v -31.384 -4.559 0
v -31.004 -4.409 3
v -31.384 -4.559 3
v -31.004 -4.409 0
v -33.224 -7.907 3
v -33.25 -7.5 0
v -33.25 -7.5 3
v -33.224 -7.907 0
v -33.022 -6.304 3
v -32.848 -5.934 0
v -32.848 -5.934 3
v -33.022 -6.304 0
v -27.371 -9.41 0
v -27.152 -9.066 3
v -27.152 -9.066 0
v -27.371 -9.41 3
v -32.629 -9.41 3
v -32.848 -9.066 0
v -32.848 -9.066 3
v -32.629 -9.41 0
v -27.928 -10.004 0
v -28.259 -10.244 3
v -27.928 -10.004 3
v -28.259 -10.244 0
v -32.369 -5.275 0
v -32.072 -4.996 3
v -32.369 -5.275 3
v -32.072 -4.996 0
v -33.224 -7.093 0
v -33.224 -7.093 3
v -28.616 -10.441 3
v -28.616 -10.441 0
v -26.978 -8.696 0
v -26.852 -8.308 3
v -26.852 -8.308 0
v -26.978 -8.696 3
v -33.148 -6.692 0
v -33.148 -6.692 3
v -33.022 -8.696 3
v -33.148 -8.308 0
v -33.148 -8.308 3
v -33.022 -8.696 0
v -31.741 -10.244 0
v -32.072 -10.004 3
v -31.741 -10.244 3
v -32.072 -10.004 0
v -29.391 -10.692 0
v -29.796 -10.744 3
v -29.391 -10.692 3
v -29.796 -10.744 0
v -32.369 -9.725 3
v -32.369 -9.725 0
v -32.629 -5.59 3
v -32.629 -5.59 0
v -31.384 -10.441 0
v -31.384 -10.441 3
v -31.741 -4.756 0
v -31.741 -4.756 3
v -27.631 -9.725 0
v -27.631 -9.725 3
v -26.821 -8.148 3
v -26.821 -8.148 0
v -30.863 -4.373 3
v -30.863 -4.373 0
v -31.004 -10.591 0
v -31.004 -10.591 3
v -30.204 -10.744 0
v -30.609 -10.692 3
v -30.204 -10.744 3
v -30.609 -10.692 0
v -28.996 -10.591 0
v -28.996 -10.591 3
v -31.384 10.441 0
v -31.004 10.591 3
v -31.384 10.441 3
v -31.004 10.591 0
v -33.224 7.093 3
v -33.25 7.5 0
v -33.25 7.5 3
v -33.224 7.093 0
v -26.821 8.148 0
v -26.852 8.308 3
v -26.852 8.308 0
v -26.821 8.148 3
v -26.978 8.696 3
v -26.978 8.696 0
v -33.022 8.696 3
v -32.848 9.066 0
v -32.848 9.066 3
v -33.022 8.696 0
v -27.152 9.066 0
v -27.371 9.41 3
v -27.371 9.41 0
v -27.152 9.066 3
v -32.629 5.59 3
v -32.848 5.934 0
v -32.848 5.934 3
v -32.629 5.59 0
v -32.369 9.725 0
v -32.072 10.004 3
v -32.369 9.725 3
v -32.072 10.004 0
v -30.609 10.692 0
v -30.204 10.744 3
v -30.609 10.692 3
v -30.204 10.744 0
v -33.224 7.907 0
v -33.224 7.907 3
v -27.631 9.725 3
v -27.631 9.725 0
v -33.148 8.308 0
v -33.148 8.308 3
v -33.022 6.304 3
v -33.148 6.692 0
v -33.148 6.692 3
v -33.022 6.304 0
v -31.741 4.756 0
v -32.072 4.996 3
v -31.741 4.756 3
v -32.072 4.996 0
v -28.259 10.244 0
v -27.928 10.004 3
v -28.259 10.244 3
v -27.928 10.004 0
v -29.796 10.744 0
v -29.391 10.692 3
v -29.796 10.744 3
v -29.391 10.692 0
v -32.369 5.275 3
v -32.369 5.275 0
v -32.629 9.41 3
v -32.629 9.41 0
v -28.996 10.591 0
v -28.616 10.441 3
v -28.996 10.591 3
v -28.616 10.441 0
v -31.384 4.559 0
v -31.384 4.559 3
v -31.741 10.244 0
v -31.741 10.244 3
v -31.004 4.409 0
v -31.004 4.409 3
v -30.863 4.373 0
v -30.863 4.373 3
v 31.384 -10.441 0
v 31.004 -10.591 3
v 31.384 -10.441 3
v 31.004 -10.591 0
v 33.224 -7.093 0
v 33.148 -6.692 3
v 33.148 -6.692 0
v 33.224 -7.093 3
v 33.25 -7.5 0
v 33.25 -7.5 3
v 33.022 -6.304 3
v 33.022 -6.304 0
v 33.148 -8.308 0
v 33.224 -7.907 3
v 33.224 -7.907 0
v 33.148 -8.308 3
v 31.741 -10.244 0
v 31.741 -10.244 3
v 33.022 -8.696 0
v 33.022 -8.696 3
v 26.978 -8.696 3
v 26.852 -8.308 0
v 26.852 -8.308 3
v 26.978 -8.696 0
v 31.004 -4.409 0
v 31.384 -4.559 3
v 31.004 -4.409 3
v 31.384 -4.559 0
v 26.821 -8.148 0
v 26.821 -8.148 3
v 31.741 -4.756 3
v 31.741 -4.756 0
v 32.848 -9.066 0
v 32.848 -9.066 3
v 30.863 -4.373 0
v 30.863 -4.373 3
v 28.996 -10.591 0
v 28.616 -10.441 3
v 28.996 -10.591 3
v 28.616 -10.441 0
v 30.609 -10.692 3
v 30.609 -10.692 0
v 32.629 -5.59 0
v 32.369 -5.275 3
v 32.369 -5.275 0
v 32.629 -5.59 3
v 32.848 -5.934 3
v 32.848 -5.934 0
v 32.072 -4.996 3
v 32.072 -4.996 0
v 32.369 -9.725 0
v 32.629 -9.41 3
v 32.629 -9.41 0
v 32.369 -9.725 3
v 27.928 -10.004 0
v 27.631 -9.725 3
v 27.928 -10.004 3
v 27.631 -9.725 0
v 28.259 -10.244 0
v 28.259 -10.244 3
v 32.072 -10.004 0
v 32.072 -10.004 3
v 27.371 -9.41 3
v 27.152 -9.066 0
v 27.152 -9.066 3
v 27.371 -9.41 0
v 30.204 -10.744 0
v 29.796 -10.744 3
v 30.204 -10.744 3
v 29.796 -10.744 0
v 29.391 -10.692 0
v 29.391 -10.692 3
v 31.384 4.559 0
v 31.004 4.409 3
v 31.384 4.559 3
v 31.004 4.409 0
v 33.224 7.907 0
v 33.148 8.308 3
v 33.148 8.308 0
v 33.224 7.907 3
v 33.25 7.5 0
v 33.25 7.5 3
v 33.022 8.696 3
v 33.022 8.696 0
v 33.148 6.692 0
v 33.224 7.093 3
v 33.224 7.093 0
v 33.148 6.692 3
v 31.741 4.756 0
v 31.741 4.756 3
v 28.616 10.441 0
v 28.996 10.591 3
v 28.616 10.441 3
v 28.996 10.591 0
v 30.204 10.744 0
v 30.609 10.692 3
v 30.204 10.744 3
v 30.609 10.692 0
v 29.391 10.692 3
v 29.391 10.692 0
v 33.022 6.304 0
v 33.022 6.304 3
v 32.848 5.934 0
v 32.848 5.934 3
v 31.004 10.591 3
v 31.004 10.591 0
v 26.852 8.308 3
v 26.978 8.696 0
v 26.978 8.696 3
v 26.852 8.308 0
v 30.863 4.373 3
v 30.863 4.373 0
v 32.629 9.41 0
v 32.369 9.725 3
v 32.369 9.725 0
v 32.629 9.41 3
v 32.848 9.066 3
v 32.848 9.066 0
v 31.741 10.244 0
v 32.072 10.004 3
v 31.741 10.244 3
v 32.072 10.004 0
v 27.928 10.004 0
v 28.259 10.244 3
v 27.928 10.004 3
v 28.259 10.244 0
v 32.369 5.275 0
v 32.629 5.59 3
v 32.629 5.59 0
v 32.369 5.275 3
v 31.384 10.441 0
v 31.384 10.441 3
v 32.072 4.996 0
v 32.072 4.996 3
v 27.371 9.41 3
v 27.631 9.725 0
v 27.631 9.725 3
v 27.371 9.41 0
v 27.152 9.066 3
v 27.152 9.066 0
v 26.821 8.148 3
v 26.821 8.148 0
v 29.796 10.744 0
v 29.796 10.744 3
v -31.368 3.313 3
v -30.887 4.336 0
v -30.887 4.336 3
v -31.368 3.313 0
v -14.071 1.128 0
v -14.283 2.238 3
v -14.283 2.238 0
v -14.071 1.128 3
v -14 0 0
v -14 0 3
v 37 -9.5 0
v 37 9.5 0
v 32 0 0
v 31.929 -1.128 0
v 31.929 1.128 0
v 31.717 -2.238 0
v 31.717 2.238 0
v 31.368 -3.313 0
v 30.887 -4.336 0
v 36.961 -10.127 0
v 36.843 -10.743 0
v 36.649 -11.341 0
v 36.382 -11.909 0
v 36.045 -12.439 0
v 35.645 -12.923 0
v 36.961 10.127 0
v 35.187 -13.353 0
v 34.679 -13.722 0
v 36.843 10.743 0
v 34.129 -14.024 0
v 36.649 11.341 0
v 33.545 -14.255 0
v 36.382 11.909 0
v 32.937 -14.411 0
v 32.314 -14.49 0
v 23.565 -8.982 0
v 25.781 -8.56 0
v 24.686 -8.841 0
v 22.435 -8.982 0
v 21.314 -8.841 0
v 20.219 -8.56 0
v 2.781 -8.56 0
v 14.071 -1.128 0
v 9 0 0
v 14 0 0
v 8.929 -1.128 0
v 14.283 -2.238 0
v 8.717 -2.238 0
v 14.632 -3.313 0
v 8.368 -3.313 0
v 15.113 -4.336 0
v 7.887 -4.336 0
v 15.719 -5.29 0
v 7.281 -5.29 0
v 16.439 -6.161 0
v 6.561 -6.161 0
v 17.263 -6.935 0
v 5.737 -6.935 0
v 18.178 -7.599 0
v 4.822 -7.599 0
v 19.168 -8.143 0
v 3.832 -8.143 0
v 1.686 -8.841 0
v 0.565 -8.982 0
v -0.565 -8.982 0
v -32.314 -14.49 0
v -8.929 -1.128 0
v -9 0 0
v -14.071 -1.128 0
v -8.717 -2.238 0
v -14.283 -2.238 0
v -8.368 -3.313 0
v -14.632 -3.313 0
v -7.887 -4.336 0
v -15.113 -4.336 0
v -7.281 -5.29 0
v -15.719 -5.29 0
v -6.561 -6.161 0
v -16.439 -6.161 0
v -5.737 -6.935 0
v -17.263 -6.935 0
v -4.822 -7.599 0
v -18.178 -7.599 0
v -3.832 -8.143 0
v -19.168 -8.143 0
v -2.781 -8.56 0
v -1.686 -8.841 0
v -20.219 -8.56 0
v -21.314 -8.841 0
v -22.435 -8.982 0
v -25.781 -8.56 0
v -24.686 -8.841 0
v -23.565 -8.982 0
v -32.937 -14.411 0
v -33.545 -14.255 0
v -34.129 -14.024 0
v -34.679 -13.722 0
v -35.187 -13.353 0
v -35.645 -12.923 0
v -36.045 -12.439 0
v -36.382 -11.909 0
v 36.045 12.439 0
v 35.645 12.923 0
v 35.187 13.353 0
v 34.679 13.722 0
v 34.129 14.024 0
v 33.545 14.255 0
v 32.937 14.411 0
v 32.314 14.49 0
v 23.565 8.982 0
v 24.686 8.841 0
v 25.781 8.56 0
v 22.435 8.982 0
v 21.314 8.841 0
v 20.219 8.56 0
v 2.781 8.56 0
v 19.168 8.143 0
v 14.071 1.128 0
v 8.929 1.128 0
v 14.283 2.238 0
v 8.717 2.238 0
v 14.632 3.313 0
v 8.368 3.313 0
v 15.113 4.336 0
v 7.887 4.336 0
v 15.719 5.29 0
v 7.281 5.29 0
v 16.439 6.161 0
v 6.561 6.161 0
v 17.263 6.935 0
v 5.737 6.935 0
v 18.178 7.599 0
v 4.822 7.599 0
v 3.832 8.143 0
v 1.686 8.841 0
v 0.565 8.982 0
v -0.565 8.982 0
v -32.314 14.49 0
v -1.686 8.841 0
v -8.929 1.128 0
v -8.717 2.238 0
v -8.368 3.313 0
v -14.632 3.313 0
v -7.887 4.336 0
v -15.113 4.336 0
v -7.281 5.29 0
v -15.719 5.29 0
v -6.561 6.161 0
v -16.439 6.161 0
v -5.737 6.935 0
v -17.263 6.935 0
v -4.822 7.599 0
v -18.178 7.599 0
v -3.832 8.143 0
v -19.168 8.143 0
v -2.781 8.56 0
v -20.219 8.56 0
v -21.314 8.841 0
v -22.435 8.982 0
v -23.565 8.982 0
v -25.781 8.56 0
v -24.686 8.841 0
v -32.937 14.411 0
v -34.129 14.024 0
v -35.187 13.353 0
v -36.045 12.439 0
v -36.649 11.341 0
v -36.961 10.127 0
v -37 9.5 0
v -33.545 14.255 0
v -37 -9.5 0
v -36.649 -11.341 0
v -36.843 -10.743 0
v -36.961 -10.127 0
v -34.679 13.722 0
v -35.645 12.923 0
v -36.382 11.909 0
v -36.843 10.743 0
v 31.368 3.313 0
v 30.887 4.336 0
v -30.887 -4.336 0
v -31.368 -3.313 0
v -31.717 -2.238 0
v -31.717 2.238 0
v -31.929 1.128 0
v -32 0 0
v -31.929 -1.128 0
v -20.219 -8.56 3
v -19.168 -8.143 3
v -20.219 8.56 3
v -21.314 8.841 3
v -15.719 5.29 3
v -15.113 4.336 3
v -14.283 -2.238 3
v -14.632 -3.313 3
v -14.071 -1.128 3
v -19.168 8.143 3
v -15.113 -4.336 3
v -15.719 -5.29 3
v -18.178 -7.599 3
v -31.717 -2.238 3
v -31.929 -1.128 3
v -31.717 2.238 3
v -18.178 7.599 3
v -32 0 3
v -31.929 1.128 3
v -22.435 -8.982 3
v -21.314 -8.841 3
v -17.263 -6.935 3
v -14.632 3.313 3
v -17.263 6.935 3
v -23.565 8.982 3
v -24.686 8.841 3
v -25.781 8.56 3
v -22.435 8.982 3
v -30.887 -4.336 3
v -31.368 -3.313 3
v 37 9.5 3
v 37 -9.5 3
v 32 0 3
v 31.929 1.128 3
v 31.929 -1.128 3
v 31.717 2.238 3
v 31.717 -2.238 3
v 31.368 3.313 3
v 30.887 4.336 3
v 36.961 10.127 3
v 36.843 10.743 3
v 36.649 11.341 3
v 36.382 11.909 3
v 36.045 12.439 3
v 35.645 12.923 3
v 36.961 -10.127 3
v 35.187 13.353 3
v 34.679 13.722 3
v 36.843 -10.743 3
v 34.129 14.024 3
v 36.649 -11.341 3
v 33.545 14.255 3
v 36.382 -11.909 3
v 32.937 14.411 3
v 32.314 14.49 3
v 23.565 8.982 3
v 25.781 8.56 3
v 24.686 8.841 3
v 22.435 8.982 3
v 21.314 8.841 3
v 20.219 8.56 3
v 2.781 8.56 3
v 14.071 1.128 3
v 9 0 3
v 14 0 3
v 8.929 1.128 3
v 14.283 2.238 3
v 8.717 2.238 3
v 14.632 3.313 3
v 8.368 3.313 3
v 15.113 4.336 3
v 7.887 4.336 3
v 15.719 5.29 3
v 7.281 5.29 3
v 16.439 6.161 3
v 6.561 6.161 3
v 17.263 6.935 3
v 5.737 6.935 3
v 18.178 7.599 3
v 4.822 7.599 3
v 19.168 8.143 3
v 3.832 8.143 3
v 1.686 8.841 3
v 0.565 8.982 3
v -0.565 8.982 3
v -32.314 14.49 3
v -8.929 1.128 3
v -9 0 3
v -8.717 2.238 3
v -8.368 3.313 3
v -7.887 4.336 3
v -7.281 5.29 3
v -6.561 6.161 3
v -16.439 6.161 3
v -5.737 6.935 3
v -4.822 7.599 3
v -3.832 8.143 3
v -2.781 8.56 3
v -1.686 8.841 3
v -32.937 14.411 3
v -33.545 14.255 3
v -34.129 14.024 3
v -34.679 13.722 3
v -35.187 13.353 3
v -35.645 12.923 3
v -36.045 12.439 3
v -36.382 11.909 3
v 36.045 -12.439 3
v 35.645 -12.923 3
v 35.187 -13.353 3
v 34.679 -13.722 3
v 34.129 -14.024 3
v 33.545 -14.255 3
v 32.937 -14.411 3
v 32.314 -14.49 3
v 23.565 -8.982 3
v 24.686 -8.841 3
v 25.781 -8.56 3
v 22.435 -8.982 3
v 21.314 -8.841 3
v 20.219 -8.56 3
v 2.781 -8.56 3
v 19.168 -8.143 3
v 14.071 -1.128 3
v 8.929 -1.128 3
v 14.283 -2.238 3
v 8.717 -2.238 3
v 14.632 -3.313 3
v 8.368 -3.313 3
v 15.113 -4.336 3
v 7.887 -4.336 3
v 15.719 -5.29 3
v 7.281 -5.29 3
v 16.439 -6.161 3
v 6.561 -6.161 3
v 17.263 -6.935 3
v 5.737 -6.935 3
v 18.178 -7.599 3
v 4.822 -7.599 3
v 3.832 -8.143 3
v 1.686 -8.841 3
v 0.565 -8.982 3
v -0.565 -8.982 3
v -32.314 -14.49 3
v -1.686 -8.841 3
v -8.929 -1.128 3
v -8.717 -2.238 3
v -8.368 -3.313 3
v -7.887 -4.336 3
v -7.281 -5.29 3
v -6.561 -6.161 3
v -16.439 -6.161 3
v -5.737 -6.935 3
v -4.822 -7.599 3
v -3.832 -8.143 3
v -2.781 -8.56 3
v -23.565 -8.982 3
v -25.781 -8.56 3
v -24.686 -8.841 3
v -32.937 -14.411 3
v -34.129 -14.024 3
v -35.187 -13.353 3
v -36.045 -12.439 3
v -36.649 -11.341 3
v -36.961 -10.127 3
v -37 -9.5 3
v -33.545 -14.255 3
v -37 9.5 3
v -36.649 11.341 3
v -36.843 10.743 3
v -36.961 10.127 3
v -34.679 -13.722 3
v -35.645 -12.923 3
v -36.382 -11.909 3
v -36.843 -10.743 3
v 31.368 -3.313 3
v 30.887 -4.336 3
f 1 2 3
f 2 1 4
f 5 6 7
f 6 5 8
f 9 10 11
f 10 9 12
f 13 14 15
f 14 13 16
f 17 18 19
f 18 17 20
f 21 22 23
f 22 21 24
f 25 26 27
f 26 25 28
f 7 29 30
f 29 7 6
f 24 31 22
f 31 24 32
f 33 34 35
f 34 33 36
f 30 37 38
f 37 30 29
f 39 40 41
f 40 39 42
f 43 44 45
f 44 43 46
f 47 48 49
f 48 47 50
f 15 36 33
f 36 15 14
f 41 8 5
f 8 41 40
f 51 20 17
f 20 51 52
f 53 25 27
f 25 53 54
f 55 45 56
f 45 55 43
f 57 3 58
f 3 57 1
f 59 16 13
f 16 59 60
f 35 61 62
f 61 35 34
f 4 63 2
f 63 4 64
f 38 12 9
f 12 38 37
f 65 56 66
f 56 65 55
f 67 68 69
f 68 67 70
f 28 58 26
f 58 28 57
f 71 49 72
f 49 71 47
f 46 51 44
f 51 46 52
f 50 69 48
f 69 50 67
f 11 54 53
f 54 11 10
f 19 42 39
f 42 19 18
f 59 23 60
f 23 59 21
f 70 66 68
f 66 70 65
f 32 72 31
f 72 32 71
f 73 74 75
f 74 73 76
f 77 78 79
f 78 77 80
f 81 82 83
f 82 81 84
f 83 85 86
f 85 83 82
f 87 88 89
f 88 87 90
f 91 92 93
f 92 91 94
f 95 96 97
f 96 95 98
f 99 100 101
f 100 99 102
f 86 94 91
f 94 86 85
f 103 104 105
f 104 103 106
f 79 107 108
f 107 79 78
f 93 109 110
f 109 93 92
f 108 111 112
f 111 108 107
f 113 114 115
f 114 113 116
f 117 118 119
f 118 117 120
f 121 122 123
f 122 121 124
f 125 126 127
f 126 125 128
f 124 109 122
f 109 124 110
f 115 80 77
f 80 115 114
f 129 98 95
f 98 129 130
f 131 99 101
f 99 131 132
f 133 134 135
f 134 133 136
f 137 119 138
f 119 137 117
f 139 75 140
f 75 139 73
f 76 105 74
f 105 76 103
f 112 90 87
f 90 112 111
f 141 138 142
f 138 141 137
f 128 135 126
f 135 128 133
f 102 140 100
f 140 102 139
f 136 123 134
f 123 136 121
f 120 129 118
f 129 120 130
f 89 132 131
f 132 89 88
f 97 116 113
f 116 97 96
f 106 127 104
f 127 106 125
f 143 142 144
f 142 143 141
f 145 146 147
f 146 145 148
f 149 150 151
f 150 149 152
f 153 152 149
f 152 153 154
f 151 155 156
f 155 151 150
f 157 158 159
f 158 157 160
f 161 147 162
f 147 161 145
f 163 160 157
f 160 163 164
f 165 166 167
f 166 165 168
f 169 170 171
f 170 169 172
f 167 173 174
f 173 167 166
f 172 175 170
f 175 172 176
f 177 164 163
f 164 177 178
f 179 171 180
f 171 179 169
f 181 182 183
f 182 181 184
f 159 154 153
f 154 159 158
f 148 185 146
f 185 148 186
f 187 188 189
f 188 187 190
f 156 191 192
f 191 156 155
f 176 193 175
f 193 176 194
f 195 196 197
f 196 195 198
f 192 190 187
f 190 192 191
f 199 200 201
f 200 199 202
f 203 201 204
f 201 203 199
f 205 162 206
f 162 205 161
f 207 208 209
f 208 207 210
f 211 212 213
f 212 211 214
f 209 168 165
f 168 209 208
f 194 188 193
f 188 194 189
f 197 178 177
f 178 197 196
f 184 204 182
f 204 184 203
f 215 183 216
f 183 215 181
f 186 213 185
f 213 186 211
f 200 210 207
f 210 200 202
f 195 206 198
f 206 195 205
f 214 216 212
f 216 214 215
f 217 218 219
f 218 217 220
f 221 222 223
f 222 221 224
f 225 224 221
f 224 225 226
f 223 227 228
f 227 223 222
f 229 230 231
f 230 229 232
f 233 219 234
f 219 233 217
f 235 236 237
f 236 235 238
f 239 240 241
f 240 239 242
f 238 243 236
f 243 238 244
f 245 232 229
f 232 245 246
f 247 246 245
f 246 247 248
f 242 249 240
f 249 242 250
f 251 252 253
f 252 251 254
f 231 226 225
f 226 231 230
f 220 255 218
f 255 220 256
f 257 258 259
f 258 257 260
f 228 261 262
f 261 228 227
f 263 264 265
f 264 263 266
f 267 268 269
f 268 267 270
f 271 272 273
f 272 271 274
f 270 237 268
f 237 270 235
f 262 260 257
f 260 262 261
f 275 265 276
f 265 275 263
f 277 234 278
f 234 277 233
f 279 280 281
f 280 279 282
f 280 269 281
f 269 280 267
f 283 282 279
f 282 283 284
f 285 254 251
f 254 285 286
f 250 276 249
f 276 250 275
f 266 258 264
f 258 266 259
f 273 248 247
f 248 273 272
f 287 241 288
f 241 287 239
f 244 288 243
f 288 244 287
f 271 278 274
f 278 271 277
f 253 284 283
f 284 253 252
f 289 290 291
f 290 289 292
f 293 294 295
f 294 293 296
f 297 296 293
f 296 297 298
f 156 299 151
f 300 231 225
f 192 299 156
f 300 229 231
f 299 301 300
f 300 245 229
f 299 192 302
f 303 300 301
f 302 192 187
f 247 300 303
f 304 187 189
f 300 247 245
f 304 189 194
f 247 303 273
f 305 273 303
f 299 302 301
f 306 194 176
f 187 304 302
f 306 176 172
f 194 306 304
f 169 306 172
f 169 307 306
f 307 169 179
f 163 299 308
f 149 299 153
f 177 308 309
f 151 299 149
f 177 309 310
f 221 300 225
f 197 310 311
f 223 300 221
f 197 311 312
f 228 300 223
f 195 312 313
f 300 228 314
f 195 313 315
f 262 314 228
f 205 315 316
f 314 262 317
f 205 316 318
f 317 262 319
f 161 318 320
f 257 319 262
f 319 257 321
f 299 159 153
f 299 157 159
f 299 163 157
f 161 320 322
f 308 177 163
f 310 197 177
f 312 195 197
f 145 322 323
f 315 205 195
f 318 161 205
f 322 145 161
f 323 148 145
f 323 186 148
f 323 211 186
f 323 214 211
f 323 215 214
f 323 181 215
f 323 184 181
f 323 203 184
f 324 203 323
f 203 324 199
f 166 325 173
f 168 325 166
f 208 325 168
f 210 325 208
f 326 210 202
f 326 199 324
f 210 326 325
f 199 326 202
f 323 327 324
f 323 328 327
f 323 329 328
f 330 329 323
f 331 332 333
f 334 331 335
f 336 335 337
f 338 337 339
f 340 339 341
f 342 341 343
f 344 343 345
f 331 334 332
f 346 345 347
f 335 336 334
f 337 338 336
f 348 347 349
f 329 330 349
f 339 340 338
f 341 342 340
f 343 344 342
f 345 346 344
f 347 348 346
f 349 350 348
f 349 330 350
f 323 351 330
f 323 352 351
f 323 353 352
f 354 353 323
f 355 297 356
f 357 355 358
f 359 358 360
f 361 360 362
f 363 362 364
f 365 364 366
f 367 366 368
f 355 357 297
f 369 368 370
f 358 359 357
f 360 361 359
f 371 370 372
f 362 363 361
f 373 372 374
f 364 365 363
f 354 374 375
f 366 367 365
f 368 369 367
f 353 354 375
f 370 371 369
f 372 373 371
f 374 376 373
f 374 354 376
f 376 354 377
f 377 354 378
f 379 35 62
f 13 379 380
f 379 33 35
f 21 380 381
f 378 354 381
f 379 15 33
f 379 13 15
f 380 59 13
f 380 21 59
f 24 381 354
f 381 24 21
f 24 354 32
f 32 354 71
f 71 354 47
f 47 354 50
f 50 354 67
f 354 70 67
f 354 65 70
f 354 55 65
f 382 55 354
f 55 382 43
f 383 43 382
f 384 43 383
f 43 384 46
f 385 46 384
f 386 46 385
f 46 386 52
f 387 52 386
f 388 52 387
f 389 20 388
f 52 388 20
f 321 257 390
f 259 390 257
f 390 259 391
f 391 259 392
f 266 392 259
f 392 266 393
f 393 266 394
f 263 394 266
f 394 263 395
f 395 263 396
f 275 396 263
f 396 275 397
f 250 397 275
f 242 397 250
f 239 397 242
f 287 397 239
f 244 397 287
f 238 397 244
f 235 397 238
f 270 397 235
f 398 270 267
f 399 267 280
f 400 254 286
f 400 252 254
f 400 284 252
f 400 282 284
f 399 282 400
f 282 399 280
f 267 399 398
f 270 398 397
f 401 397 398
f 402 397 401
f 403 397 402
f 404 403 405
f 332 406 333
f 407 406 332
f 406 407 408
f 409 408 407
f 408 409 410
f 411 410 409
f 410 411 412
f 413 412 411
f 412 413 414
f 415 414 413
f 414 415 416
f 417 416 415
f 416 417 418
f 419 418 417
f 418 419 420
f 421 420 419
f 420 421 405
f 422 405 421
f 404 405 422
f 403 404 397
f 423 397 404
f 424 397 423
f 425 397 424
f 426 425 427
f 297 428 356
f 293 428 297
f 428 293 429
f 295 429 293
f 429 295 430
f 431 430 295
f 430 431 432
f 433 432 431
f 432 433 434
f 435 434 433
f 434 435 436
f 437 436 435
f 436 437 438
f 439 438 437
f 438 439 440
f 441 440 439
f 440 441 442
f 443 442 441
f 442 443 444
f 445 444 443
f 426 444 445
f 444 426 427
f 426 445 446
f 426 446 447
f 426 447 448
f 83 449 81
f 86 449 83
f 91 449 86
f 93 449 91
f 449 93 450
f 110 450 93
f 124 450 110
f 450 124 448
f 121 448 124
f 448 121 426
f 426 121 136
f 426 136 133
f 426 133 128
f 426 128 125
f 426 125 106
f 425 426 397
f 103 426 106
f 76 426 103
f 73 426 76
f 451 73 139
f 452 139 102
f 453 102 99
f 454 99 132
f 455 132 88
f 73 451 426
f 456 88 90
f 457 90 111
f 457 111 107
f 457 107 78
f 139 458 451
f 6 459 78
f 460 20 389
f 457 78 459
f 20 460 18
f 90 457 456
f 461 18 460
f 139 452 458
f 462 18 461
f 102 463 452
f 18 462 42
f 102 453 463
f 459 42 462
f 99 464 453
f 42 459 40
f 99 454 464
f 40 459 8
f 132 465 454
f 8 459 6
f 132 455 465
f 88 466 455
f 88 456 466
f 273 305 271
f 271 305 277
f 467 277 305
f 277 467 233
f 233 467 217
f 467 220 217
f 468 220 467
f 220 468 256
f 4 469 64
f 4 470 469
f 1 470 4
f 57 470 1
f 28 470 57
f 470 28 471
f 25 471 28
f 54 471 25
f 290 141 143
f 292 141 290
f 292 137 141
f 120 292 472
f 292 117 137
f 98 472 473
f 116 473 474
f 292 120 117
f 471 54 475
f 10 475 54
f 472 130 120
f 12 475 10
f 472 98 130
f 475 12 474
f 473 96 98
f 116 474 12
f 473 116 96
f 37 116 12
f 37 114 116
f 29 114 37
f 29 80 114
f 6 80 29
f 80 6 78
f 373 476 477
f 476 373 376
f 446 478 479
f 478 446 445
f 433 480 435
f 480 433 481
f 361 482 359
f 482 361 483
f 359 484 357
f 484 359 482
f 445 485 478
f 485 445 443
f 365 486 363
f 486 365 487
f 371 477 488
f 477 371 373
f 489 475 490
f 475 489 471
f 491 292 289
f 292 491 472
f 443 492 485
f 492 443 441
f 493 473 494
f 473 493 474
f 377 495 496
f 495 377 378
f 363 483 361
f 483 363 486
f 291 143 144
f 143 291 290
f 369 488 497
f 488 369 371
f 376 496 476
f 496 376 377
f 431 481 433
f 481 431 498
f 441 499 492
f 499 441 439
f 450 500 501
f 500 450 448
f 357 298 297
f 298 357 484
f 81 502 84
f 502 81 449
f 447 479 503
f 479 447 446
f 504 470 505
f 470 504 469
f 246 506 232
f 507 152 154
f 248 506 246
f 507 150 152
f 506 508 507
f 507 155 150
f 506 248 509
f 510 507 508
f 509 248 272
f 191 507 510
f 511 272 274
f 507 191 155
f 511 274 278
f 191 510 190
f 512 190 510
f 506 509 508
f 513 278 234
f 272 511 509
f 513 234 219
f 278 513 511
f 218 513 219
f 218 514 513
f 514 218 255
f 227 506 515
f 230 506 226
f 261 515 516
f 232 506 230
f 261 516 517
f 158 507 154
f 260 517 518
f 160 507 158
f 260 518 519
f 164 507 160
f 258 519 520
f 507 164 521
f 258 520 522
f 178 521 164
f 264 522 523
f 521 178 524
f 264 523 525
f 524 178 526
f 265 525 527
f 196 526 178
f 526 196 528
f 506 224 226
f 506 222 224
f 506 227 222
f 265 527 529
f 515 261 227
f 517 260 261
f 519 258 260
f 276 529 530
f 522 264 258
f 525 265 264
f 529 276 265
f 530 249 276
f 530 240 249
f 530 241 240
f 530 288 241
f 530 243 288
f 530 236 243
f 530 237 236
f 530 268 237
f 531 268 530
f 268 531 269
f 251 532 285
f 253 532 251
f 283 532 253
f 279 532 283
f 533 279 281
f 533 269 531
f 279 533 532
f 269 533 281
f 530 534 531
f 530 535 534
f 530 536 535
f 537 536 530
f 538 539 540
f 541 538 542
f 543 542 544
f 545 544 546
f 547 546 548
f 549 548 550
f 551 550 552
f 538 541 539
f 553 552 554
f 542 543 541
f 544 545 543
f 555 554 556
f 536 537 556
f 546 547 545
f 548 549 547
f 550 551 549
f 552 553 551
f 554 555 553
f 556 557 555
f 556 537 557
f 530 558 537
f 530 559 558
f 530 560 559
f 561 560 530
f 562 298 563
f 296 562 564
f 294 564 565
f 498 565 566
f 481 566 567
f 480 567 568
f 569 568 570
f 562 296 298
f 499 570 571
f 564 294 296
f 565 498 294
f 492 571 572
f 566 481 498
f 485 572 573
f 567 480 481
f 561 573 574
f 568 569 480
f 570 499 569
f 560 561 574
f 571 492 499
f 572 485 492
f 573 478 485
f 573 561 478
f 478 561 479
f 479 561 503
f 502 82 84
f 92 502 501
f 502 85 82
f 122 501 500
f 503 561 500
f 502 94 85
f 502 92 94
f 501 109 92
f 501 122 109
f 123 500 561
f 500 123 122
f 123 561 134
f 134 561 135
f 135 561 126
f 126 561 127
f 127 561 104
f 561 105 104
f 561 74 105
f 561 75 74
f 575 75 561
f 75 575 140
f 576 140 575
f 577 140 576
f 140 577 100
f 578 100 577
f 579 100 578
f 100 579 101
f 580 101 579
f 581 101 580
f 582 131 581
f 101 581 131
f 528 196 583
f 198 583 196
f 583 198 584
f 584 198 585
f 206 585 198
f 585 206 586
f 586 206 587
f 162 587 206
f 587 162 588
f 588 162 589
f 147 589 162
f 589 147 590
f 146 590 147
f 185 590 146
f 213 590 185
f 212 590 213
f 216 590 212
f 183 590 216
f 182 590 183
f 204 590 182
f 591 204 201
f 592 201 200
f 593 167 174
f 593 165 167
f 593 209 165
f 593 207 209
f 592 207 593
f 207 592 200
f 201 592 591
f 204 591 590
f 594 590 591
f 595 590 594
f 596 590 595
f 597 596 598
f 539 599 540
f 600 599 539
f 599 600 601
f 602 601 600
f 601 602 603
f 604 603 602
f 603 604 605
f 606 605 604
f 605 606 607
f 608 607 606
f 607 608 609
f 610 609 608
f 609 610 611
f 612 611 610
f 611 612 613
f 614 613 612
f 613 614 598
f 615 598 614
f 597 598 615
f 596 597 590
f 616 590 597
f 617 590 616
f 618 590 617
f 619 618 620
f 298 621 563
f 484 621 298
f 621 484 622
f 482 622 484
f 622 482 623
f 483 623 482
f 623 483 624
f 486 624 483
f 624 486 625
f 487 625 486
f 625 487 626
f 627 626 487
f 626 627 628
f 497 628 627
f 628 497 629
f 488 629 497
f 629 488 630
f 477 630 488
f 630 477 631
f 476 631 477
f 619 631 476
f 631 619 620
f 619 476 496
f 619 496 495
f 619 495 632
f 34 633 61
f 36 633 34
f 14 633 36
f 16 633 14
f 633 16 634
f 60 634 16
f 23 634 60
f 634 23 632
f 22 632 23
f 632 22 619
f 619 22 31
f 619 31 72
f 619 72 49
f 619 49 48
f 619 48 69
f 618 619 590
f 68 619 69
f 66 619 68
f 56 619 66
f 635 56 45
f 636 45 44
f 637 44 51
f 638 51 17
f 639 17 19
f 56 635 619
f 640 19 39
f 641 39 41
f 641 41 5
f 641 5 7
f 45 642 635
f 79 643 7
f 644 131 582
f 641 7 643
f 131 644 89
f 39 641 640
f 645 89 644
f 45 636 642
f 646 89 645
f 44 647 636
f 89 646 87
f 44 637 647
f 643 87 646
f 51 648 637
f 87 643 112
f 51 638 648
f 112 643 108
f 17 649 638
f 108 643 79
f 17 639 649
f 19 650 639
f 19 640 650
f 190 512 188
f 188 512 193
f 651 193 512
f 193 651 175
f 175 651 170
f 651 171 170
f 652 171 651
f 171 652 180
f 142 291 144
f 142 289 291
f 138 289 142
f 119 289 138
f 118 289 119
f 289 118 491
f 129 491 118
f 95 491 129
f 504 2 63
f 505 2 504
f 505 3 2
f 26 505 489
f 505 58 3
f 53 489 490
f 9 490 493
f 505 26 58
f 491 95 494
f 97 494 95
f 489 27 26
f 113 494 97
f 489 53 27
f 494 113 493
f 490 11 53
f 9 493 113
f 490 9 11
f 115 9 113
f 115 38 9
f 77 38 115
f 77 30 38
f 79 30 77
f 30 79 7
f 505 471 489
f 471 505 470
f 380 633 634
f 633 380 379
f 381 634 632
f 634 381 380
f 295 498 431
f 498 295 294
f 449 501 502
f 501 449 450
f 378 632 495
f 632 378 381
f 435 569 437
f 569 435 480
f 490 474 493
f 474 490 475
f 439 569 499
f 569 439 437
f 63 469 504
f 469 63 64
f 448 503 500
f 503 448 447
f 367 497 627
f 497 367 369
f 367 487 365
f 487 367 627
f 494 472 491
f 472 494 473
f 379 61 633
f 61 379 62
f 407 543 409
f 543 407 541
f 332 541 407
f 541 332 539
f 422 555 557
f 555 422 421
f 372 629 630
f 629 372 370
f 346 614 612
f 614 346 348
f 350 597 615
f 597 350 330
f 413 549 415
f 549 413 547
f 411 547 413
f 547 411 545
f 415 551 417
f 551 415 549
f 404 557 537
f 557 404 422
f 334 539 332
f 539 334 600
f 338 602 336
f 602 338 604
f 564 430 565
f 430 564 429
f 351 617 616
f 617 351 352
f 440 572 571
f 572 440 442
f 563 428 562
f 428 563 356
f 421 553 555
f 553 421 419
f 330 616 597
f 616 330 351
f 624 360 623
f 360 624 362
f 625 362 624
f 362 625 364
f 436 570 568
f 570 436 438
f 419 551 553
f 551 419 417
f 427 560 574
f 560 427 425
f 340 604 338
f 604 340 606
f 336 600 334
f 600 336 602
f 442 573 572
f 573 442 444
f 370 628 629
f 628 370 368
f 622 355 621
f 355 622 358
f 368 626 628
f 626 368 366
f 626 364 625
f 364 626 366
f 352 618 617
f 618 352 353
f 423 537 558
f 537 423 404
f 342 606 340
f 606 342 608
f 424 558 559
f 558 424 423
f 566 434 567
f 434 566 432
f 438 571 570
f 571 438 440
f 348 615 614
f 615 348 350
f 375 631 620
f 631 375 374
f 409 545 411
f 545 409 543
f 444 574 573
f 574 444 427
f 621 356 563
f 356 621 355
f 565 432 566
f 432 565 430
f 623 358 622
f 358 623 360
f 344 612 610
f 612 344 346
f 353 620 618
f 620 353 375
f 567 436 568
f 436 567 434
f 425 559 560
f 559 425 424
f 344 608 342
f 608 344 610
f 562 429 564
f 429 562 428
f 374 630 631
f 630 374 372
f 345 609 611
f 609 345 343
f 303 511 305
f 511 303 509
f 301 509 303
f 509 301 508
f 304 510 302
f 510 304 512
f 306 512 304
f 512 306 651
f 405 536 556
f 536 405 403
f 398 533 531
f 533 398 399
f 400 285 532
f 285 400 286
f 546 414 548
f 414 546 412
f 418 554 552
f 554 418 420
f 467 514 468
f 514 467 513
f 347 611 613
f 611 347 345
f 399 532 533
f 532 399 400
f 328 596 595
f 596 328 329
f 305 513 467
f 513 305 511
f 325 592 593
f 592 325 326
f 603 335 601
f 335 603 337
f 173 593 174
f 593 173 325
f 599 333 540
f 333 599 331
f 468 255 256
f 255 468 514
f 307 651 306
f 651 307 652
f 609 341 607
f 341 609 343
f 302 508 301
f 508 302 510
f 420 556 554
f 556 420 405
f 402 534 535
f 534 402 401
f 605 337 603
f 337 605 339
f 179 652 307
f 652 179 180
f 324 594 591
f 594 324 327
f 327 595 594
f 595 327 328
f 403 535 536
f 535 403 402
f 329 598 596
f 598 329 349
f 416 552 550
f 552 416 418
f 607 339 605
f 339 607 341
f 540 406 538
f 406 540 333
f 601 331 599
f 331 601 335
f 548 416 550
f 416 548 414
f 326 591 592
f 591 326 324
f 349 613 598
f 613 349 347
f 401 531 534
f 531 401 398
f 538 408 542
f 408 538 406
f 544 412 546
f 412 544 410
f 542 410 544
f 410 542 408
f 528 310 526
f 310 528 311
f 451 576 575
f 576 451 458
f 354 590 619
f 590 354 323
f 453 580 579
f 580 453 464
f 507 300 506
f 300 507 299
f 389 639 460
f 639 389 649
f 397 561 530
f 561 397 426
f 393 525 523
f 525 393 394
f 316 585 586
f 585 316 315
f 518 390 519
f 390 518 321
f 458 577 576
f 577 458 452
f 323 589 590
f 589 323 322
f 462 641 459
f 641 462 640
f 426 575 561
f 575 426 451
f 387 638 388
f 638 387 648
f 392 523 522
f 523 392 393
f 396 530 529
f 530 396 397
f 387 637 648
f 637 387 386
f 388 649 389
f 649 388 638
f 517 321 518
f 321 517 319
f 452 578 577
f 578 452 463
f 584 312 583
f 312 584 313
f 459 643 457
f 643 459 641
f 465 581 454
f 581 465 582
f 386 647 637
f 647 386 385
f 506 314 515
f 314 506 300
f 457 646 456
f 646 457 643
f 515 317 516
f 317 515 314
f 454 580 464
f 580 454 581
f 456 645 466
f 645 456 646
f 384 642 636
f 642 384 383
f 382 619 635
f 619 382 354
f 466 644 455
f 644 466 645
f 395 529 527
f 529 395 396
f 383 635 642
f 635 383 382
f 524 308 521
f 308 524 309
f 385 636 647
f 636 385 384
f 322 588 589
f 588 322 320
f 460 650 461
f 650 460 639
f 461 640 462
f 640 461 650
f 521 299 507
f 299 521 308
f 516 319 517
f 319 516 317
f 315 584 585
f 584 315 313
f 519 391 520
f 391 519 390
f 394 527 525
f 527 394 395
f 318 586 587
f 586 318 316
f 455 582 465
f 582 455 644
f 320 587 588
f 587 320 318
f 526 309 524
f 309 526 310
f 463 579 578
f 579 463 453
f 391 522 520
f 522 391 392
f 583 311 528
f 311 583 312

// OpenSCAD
$fn = 50;


difference() {
	union() {
		hull() {
			translate(v = [-32.0000000000, 9.5000000000, 0]) {
				cylinder(h = 3, r = 5);
			}
			translate(v = [32.0000000000, 9.5000000000, 0]) {
				cylinder(h = 3, r = 5);
			}
			translate(v = [-32.0000000000, -9.5000000000, 0]) {
				cylinder(h = 3, r = 5);
			}
			translate(v = [32.0000000000, -9.5000000000, 0]) {
				cylinder(h = 3, r = 5);
			}
		}
	}
	union() {
		#translate(v = [-30.0000000000, -7.5000000000, -100.0000000000]) {
			cylinder(h = 200, r = 3.2500000000);
		}
		#translate(v = [-30.0000000000, 7.5000000000, -100.0000000000]) {
			cylinder(h = 200, r = 3.2500000000);
		}
		#translate(v = [30.0000000000, -7.5000000000, -100.0000000000]) {
			cylinder(h = 200, r = 3.2500000000);
		}
		#translate(v = [30.0000000000, 7.5000000000, -100.0000000000]) {
			cylinder(h = 200, r = 3.2500000000);
		}
		#translate(v = [-23.0000000000, 0, 0]) {
			cylinder(h = 3, r = 9.0000000000);
		}
		#cylinder(h = 3, r = 9.0000000000);
		#translate(v = [23.0000000000, 0, 0]) {
			cylinder(h = 3, r = 9.0000000000);
		}
	}
}
